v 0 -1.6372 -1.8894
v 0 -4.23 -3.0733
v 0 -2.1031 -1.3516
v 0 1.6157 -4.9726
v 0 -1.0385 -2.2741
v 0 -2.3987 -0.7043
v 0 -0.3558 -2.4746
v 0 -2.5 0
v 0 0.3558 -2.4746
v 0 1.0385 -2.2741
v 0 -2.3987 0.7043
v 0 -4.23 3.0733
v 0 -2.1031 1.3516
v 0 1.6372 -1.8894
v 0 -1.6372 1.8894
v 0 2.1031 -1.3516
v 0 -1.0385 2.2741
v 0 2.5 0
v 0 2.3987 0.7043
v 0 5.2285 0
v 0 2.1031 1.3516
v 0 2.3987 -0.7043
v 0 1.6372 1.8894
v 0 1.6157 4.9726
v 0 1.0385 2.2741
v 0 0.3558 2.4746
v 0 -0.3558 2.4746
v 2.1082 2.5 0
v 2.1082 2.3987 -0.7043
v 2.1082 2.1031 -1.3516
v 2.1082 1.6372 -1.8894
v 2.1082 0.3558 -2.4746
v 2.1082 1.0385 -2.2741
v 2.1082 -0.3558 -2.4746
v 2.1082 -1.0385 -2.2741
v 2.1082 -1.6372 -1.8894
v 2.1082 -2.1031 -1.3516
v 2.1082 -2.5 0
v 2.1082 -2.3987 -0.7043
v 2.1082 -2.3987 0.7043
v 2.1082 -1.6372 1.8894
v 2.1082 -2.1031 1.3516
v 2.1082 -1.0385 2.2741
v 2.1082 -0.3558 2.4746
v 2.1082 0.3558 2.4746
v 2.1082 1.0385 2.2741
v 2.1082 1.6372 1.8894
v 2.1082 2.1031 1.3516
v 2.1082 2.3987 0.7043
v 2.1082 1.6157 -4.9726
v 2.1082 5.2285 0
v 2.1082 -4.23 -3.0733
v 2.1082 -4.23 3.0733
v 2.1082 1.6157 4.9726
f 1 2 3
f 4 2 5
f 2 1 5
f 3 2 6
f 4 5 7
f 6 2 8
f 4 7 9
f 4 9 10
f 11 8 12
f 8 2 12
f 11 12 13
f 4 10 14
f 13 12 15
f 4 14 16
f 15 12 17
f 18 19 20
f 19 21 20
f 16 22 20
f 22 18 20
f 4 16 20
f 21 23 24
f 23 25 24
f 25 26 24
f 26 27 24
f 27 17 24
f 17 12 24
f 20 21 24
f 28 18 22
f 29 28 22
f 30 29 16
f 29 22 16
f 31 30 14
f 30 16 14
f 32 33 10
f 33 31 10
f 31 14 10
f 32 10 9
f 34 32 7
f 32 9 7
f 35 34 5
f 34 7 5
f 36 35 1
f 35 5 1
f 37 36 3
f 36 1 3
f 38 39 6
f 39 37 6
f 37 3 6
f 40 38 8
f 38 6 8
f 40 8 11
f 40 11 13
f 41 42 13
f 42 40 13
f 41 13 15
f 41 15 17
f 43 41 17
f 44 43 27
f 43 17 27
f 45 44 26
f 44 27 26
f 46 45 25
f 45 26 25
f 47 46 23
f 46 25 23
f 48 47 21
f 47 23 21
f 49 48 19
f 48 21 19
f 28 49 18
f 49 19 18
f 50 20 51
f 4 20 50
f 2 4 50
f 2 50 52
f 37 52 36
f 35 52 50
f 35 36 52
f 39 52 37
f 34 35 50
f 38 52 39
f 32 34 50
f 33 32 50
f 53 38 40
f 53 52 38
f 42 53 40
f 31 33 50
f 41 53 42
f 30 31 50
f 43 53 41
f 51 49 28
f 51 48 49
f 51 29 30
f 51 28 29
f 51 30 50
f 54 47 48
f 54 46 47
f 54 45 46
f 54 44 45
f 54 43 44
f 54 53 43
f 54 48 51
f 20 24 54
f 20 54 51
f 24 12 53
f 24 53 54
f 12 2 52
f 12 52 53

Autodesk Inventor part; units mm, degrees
ref_plane "YZ Plane" through (0, 0, 0) normal (1, 0, 0) x (0, 1, 0)
ref_plane "XZ Plane" through (0, 0, 0) normal (0, 1, 0) x (-1, 0, 0)
ref_plane "XY Plane" through (0, 0, 0) normal (0, 0, 1) x (1, 0, 0)
sketch "Sketch1" plane through (0, 0, 0) normal (1, 0, 0) x (0, 1, 0)
  circle A0 centre (0, 0) radius 2.5
  line L0 (5.2285, 0) -> (1.6157, -4.9726)
  line L1 (1.6157, -4.9726) -> (-4.23, -3.0733)
  line L2 (-4.23, -3.0733) -> (-4.23, 3.0733)
  line L3 (-4.23, 3.0733) -> (1.6157, 4.9726)
  line L4 (1.6157, 4.9726) -> (5.2285, 0)
  dimension "d0" = 5
extrude "Extrusion1" add sketch "Sketch1" along normal blind 2.1082
properties part number "Bracket"
